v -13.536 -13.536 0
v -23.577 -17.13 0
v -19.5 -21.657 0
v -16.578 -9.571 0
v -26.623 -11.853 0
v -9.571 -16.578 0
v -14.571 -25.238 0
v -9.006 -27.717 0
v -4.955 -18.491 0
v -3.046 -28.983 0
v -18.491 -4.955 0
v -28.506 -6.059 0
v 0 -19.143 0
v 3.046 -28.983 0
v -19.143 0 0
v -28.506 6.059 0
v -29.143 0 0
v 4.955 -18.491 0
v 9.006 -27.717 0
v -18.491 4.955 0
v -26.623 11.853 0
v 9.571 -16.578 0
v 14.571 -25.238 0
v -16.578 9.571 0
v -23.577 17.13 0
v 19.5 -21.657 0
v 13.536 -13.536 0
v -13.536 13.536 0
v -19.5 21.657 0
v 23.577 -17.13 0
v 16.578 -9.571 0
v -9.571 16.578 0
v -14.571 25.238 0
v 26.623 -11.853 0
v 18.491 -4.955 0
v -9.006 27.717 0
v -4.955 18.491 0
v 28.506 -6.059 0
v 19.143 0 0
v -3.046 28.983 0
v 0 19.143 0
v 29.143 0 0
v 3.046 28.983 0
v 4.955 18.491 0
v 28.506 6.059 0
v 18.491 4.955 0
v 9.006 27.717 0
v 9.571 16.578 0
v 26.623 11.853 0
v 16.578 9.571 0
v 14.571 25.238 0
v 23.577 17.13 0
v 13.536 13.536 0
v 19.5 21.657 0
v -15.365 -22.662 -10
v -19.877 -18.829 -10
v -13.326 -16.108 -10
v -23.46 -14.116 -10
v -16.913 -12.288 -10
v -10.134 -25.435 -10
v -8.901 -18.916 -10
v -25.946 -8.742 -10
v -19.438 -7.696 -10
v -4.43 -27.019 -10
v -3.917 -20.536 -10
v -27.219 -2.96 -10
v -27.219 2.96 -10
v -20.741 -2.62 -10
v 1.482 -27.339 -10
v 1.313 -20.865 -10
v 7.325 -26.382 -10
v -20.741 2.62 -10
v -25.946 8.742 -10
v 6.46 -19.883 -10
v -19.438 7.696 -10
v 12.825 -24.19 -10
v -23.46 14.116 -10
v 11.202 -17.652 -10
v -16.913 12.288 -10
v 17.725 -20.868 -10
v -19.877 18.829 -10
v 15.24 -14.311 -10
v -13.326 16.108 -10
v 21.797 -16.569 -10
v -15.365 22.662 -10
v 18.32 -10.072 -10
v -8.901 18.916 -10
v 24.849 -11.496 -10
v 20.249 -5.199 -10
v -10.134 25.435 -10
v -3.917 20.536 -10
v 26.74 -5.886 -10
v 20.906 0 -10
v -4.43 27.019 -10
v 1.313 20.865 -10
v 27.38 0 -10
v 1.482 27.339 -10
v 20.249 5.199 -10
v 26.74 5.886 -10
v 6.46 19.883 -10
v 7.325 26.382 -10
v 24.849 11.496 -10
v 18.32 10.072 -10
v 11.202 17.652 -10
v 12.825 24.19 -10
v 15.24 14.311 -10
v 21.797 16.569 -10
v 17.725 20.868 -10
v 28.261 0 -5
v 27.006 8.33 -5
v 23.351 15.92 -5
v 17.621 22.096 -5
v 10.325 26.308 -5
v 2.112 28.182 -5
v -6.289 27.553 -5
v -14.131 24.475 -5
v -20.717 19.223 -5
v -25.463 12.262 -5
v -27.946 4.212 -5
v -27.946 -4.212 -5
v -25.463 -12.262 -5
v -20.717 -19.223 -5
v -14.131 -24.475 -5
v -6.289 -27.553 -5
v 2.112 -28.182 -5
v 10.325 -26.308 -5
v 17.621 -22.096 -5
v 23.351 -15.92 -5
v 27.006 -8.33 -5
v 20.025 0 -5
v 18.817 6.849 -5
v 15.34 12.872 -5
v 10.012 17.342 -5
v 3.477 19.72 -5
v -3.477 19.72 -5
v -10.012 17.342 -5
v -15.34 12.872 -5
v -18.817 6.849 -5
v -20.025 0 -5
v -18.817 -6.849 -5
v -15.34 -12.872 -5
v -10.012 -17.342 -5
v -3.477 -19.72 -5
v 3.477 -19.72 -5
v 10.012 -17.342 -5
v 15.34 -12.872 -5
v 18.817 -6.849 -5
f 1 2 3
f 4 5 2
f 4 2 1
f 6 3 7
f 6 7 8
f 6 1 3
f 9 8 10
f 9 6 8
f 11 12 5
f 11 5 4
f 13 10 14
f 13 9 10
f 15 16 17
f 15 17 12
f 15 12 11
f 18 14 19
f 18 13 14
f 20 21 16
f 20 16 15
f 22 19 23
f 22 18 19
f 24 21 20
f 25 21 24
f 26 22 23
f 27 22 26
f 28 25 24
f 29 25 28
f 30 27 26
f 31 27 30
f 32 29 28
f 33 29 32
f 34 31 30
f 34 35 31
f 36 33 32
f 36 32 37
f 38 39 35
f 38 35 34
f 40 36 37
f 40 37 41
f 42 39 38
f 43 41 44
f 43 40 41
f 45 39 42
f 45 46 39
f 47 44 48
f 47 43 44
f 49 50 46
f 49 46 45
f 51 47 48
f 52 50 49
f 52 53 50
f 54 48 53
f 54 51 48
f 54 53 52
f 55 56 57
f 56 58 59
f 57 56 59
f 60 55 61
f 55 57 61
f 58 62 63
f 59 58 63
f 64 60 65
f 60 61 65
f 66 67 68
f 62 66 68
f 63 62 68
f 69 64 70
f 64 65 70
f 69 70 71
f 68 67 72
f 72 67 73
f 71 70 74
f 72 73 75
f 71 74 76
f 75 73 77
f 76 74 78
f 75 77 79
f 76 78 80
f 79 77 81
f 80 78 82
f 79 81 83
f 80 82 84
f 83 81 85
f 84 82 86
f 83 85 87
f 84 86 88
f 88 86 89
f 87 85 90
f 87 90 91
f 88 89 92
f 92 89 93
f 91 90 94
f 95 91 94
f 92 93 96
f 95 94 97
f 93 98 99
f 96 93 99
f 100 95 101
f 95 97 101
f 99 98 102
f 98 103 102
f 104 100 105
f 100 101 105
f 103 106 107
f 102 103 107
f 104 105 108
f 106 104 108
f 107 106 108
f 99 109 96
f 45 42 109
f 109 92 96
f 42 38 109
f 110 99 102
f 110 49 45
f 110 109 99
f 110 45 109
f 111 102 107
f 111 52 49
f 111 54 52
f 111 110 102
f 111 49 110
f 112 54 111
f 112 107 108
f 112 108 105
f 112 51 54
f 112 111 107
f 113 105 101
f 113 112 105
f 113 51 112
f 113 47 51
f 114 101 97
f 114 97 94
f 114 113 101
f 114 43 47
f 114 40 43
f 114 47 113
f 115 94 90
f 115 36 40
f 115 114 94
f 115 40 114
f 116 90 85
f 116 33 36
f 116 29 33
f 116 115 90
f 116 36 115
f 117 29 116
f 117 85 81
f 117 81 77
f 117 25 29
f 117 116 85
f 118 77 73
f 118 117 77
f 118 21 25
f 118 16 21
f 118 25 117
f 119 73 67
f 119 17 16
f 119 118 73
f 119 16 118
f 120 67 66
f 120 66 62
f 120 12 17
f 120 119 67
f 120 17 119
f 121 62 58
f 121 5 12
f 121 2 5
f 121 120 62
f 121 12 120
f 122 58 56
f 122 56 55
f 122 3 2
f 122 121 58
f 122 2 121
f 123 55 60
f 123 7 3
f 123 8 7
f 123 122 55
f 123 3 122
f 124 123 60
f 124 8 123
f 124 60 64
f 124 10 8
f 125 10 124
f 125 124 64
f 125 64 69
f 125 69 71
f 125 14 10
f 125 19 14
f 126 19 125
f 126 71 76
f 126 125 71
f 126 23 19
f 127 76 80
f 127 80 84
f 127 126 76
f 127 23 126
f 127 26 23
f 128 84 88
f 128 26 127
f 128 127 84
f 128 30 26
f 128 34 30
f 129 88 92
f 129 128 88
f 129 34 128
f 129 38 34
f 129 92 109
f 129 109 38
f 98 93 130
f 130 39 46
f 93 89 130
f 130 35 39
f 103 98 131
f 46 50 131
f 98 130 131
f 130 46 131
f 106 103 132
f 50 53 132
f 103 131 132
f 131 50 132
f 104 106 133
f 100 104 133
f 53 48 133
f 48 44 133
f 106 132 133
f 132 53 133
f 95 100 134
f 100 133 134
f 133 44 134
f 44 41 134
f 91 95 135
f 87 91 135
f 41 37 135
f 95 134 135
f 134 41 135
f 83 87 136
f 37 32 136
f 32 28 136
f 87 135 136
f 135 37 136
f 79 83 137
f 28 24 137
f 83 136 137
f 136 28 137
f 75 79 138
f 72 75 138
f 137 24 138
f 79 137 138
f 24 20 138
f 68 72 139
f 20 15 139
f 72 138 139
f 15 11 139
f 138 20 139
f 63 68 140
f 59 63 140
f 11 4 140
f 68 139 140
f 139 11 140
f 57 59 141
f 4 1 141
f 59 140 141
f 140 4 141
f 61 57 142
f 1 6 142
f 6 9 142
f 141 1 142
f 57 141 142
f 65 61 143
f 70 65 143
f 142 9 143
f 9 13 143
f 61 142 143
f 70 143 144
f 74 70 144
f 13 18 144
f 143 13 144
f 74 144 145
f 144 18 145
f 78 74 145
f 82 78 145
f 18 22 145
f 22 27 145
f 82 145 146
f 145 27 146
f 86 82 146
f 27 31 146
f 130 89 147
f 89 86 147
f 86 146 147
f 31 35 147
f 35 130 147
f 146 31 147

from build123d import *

# Parameters (mm, degrees)
SKETCH_1_3_R    = 29.142907565
SKETCH_1_3_R_2  = 19.142907565
EXTRUDE_1_DEPTH = 10
EXTRUDE_1_DRAFT = -10


with BuildPart() as part:
    # Эскиз1<3> → Бобышка-Вытянуть1 (with draft: the straight prism first)
    with BuildSketch(Plane.XY):
        Circle(SKETCH_1_3_R)
        Circle(SKETCH_1_3_R_2, mode=Mode.SUBTRACT)
    extrude(amount=-EXTRUDE_1_DEPTH)
    # Бобышка-Вытянуть1: the draft: its side faces are tilted about the plane it starts from
    extrude_1_sides = [part.faces().sort_by_distance(p)[0] for p in [
        (-29.142907565, 0, -5),
        (-19.142907565, 0, -5),
    ]]
    draft(extrude_1_sides, Plane.XY, EXTRUDE_1_DRAFT)


solid = part.part
